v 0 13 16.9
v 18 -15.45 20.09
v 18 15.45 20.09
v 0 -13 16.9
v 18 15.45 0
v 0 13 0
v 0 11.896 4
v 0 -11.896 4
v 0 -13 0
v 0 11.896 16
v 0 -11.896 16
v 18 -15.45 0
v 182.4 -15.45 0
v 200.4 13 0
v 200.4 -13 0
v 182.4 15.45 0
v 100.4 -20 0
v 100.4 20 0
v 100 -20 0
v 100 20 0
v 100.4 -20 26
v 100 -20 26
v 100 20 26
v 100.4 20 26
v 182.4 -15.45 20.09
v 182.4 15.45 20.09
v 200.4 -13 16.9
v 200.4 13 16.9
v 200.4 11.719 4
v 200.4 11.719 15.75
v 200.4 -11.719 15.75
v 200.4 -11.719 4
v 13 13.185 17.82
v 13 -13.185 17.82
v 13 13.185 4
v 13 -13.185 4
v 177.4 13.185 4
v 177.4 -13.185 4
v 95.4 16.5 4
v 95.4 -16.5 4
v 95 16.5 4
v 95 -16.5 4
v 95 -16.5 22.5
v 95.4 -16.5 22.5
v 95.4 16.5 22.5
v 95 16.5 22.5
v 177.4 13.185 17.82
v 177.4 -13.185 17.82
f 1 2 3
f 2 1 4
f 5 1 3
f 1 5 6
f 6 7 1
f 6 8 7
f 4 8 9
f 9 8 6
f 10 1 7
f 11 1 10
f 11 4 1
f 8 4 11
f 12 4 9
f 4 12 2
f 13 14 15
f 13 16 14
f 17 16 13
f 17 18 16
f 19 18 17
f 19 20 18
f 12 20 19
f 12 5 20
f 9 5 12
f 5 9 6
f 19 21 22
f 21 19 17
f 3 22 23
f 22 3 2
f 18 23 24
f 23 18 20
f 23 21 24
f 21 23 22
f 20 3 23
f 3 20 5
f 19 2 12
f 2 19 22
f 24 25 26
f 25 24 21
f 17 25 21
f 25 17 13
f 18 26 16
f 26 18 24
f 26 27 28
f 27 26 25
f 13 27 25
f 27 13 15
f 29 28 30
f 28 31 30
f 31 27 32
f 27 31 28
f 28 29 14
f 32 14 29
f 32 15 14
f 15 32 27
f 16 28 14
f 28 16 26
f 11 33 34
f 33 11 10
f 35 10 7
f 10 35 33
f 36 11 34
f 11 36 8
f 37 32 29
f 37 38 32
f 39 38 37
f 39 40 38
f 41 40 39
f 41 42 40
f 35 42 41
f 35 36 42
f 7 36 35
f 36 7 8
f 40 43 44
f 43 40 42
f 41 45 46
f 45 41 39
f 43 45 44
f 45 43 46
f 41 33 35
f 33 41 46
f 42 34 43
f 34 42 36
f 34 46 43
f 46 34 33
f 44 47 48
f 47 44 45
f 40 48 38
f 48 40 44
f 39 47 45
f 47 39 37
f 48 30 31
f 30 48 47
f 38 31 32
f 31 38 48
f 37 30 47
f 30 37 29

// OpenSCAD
$fn = 32;

// ----------------------------------------------------------------------
// Faired channel: 200 x 40 x 26 mm, 3.5 mm walls, faired ends
// ----------------------------------------------------------------------

// --- parameters (mm) ---
length = 200;             // channel length
width = 40;               // channel width at mid length
height = 26;              // channel height at mid length
wall = 3.5;               // side wall thickness
floor_t = 4;              // floor thickness
end_w = 26;               // faired end width
end_h = 16.9;             // faired end height

difference() {
  union() {
    hull() {
      translate([0, -13, 0]) cube([0.4, 26, 16.9]);
      translate([18, -15.45, 0]) cube([0.4, 30.9, 20.09]);
    }
    hull() {
      translate([18, -15.45, 0]) cube([0.4, 30.9, 20.09]);
      translate([100, -20, 0]) cube([0.4, 40, 26]);
    }
    hull() {
      translate([100, -20, 0]) cube([0.4, 40, 26]);
      translate([182, -15.45, 0]) cube([0.4, 30.9, 20.09]);
    }
    hull() {
      translate([182, -15.45, 0]) cube([0.4, 30.9, 20.09]);
      translate([200, -13, 0]) cube([0.4, 26, 16.9]);
    }
  }
  /* cavity, 5 mm proud of both ends so the ports are cut clean */
  hull() {
    translate([-5, -11.4, 4]) cube([0.4, 22.8, 11.3]);
    translate([13, -13.185, 4]) cube([0.4, 26.37, 13.82]);
  }
  hull() {
    translate([13, -13.185, 4]) cube([0.4, 26.37, 13.82]);
    translate([95, -16.5, 4]) cube([0.4, 33, 18.5]);
  }
  hull() {
    translate([95, -16.5, 4]) cube([0.4, 33, 18.5]);
    translate([177, -13.185, 4]) cube([0.4, 26.37, 13.82]);
  }
  hull() {
    translate([177, -13.185, 4]) cube([0.4, 26.37, 13.82]);
    translate([205, -11.4, 4]) cube([0.4, 22.8, 11.3]);
  }
}
